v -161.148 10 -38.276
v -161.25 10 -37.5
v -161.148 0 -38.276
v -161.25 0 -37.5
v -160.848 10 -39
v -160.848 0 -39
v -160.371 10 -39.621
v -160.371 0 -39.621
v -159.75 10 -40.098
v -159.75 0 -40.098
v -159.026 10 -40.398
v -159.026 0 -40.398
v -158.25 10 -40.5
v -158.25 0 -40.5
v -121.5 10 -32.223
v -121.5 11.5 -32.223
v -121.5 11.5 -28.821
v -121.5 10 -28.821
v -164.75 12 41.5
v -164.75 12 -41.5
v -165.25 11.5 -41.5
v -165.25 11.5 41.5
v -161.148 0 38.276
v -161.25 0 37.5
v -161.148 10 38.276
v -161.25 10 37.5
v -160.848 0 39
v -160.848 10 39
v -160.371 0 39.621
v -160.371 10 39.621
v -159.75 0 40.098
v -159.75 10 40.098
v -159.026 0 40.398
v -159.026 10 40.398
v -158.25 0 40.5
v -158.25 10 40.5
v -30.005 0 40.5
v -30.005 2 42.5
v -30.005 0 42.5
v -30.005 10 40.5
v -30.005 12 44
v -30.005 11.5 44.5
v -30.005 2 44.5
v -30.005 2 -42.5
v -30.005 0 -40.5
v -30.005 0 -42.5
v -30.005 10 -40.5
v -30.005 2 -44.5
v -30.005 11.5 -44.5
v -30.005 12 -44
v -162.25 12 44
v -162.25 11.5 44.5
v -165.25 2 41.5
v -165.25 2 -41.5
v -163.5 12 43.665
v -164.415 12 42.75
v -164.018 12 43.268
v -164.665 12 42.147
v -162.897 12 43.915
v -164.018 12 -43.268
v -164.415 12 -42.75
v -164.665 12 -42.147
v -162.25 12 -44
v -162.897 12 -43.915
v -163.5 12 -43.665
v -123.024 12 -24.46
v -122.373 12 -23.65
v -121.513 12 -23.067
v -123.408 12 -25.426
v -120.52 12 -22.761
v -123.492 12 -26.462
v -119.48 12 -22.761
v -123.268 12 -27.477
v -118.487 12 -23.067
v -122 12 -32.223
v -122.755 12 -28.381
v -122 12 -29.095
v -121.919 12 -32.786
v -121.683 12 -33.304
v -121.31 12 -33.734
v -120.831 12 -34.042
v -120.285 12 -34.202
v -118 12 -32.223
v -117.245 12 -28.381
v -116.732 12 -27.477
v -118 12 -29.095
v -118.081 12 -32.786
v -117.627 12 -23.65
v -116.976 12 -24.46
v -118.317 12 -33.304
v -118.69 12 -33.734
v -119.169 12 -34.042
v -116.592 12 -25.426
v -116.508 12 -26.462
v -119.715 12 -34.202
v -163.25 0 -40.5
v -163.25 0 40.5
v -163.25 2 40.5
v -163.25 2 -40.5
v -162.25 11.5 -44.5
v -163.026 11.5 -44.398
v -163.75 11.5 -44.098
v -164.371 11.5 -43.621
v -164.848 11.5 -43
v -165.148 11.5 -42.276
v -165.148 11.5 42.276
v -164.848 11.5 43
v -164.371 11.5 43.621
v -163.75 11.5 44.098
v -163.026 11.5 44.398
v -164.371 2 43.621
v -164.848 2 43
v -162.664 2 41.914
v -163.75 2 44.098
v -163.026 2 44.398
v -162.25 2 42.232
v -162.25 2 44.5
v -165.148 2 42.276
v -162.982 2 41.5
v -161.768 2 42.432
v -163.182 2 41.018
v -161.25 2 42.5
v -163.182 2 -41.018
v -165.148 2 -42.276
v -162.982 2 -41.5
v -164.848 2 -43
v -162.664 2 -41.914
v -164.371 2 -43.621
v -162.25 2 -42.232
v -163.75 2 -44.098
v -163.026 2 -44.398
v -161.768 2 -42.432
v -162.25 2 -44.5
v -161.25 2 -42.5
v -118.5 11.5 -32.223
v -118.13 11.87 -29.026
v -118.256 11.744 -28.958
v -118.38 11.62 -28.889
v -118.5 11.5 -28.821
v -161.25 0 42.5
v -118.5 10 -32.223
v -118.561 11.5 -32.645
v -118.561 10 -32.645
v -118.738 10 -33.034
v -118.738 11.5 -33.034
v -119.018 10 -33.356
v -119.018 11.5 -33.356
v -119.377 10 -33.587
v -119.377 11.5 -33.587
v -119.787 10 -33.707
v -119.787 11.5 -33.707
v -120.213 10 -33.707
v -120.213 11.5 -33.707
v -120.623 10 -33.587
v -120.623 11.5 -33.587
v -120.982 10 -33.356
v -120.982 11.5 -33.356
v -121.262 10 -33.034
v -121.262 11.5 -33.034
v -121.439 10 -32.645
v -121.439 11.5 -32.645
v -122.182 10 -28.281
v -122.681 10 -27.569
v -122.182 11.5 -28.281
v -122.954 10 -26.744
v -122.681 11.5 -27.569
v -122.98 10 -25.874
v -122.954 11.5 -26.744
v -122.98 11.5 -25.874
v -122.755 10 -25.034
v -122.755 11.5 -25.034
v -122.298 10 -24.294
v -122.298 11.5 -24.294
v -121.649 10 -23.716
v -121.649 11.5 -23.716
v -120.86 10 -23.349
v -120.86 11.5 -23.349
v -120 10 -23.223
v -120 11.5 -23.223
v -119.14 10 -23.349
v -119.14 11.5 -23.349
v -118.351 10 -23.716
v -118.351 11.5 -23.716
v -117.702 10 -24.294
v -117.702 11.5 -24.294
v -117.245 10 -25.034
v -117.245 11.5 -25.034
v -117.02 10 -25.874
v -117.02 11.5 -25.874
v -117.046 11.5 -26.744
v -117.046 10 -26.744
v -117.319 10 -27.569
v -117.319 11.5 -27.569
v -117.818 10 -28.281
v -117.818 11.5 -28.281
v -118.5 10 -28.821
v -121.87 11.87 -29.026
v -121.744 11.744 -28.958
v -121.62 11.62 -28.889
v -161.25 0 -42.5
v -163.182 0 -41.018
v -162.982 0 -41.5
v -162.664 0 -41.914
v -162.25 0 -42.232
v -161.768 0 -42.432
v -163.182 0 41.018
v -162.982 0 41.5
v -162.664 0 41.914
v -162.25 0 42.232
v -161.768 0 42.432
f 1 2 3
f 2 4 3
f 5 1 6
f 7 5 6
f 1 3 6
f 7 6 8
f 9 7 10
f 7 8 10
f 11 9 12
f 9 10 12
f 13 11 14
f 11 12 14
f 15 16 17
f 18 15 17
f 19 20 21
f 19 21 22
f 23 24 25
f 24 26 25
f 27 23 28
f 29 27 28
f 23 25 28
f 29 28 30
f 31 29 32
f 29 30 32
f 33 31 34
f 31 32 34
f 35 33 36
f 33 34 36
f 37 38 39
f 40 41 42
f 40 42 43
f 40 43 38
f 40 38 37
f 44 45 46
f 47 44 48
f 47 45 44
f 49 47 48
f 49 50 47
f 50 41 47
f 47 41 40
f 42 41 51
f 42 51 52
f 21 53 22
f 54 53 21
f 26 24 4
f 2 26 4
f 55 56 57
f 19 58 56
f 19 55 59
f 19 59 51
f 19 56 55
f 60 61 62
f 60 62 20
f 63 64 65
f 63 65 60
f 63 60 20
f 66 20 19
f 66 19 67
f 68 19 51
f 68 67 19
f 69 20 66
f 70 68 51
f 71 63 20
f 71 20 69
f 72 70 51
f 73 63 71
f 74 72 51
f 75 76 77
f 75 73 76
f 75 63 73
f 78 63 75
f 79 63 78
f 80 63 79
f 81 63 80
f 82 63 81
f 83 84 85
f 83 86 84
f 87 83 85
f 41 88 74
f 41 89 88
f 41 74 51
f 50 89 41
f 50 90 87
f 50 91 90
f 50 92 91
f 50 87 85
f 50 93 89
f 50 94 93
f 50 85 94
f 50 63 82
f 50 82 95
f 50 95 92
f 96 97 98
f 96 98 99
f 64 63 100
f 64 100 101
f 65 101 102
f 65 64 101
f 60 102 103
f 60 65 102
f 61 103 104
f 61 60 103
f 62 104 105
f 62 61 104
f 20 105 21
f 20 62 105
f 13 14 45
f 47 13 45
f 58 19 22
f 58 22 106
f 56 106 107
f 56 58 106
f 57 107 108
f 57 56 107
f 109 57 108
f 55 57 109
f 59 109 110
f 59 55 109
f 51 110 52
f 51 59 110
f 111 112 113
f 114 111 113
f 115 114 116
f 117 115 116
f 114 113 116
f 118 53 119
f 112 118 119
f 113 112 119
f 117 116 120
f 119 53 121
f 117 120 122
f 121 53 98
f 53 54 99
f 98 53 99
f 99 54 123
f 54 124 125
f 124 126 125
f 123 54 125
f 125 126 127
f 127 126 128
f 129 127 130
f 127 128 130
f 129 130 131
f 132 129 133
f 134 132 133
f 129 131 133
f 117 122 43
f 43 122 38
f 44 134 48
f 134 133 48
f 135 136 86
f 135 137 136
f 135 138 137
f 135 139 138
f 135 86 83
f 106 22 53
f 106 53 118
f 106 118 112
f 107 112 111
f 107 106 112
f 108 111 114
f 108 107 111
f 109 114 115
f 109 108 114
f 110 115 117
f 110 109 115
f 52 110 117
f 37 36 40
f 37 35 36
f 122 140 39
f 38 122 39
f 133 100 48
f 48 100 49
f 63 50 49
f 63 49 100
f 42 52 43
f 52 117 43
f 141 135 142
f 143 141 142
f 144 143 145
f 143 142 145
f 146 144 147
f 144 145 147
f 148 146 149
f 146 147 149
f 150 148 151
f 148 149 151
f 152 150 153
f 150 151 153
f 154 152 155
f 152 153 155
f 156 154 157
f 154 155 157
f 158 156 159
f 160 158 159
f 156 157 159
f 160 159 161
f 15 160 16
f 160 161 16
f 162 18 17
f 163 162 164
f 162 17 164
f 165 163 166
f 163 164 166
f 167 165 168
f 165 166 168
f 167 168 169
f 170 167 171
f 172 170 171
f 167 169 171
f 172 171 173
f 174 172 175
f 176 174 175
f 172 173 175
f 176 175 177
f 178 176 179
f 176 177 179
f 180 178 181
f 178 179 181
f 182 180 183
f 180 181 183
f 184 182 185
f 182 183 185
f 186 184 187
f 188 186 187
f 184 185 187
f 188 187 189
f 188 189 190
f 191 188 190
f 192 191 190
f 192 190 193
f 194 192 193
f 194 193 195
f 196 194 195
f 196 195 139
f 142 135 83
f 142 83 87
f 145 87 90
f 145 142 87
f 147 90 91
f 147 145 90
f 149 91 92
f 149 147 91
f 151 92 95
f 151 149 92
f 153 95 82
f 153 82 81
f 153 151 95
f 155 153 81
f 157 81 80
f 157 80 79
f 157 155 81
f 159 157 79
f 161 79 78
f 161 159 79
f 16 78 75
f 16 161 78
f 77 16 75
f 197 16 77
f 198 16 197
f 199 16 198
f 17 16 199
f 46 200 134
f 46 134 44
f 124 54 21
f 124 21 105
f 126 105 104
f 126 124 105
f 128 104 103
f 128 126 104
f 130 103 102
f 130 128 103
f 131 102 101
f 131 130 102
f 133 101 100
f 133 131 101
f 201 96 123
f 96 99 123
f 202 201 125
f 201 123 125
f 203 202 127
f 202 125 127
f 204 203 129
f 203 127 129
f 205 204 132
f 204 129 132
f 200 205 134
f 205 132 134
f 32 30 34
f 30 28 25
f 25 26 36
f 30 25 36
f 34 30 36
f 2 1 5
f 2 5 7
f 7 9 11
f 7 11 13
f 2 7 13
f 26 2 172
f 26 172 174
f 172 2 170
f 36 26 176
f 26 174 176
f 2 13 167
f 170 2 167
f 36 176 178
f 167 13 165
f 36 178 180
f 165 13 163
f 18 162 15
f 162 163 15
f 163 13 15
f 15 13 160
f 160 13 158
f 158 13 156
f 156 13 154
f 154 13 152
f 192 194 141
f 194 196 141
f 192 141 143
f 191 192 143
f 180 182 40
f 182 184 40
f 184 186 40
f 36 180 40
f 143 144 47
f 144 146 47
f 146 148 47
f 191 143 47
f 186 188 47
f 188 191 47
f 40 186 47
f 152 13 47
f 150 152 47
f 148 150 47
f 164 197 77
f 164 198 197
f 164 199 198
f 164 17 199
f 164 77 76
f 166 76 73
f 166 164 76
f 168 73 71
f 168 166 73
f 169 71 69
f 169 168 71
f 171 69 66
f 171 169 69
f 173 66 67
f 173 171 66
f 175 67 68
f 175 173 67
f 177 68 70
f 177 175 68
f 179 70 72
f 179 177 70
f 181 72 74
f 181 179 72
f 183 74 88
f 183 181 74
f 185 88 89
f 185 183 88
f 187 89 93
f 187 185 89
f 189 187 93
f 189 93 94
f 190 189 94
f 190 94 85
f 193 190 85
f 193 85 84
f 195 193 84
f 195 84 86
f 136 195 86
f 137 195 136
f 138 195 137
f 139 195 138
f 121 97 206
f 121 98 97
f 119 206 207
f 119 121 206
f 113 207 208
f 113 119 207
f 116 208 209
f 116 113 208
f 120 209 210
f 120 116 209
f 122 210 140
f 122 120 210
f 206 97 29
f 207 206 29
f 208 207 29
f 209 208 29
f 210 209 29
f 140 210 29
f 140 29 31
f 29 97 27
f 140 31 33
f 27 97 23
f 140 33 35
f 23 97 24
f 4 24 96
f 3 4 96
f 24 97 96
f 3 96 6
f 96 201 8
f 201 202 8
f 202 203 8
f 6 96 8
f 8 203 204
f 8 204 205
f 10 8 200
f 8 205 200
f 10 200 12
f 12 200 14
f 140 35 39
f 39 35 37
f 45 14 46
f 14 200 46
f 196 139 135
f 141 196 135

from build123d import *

# Parameters (mm, degrees)
SKETCH1_W           = 326.5
SKETCH1_H           = 85
SKETCH1_W_2         = 322.5
SKETCH1_H_2         = 81
BOSS_EXTRUDE1_DEPTH = 10
SKETCH2_W           = 330.5
SKETCH2_H           = 89
SKETCH2_W_2         = 322.5
SKETCH2_H_2         = 81
BOSS_EXTRUDE2_DEPTH = 8
SKETCH3_W           = 330.5
SKETCH3_H           = 89
BOSS_EXTRUDE3_DEPTH = 2
FILLET1_R           = 3
FILLET2_R           = 2
FILLET3_R           = 3
CHAMFER1_SIZE       = 0.5
CUT_EXTRUDE1_DEPTH  = 172.557024047
CHAMFER2_SIZE       = 0.5
SKETCH7_W           = 40
SKETCH7_H           = 6.166023439
CUT_EXTRUDE3_DEPTH  = 189.075948755
BOSS_EXTRUDE4_REACH = 190.076
FILLET4_R           = 2
CHAMFER3_SIZE       = 0.5
FILLET5_R           = 3
FILLET6_R           = 2
SKETCH9_R           = 16.25
SKETCH9_R_2         = 14.25
BOSS_EXTRUDE5_DEPTH = 3
SKETCH10_R          = 1.5
SKETCH10_R_2        = 2
SKETCH10_R_3        = 2.25
CUT_EXTRUDE4_DEPTH  = 172.279924393
CHAMFER4_SIZE       = 0.5
SKETCH12_W          = 30.6
SKETCH12_H          = 39
SKETCH12_W_2        = 26.6
SKETCH12_H_2        = 35
BOSS_EXTRUDE6_DEPTH = 6
SKETCH13_W          = 30.6
SKETCH13_H          = 4
BOSS_EXTRUDE7_DEPTH = 2.7
SKETCH14_W          = 3.373769955
SKETCH14_H          = 15.899358316
SKETCH14_W_2        = 15.312861043
SKETCH14_H_2        = 6.106571476
SKETCH14_W_3        = 6.70369678
SKETCH14_H_3        = 18.082973575
CUT_EXTRUDE5_DEPTH  = 6
FILLET7_R           = 2
CUT_EXTRUDE6_DEPTH  = 12.7
CUT_EXTRUDE7_DEPTH  = 12.7
CUT_EXTRUDE8_DEPTH  = 12.7
SKETCH19_W          = 25
SKETCH19_H          = 25.3
SKETCH19_W_2        = 21
SKETCH19_H_2        = 21.3
BOSS_EXTRUDE8_DEPTH = 6
SKETCH20_W          = 17
SKETCH20_H          = 11.292116592
CUT_EXTRUDE9_DEPTH  = 6
FILLET8_R           = 2
FILLET9_R           = 2
FILLET10_R          = 1
SKETCH18_W          = 231.079625222
SKETCH18_H          = 131.716143141
CUT_EXTRUDE11_DEPTH = 172.557024047


# Some blends are built 0.0001 mm under size
with BuildPart() as part:
    # Sketch1 → Boss-Extrude1 (new body)
    with BuildSketch(Plane(origin=(0, 0, 0), x_dir=(1, 0, 0), z_dir=(0, 1, 0))):
        Rectangle(SKETCH1_W, SKETCH1_H)
        Rectangle(SKETCH1_W_2, SKETCH1_H_2, mode=Mode.SUBTRACT)
    extrude(amount=BOSS_EXTRUDE1_DEPTH)

    # Sketch2 → Boss-Extrude2 (add)
    with BuildSketch(Plane(origin=(0, 10, 0), x_dir=(1, 0, 0), z_dir=(0, 1, 0))):
        Rectangle(SKETCH2_W, SKETCH2_H)
        Rectangle(SKETCH2_W_2, SKETCH2_H_2, mode=Mode.SUBTRACT)
    extrude(amount=-BOSS_EXTRUDE2_DEPTH)

    # Sketch3 → Boss-Extrude3 (add)
    with BuildSketch(Plane(origin=(0, 10, 0), x_dir=(1, 0, 0), z_dir=(0, 1, 0))):
        Rectangle(SKETCH3_W, SKETCH3_H)
    extrude(amount=BOSS_EXTRUDE3_DEPTH)

    # Fillet1
    fillet1_edges = [part.edges().sort_by_distance(p)[0] for p in [
        (161.25, 5, 40.5),
        (161.25, 5, -40.5),
        (-161.25, 5, -40.5),
        (-161.25, 5, 40.5),
    ]]
    fillet(fillet1_edges, radius=FILLET1_R)

    # Fillet2
    fillet2_edges = [part.edges().sort_by_distance(p)[0] for p in [
        (163.25, 1, 42.5),
        (-163.25, 1, 42.5),
        (-163.25, 1, -42.5),
        (163.25, 1, -42.5),
    ]]
    fillet(fillet2_edges, radius=FILLET2_R)

    # Fillet3
    fillet3_edges = [part.edges().sort_by_distance(p)[0] for p in [
        (165.25, 7, -44.5),
        (165.25, 7, 44.5),
        (-165.25, 7, 44.5),
        (-165.25, 7, -44.5),
    ]]
    fillet(fillet3_edges, radius=FILLET3_R)

    # Chamfer1
    chamfer1_edges = [part.edges().sort_by_distance(p)[0] for p in [
        (165.25, 12, 0),
        (-165.25, 12, 0),
        (0, 12, 44.5),
        (0, 12, -44.5),
        (-164.371320344, 12, -43.621320344),
        (-164.371320344, 12, 43.621320344),
        (164.371320344, 12, 43.621320344),
        (164.371320344, 12, -43.621320344),
    ]]
    chamfer(chamfer1_edges, length=CHAMFER1_SIZE)

    # Sketch4 → Cut-Extrude1 (cut, through all)
    with BuildSketch(Plane(origin=(0, 12, 0), x_dir=(1, 0, 0), z_dir=(0, 1, 0))):
        with BuildLine():
            Line((-121.5, 32.222687085), (-121.5, 28.820763297))
            ThreePointArc((-121.5, 28.820763297), (-120, 23.222687085), (-118.5, 28.820763297))
            Line((-118.5, 28.820763297), (-118.5, 32.222687085))
            ThreePointArc((-118.5, 32.222687085), (-120, 33.722687085), (-121.5, 32.222687085))
        make_face()
        with BuildLine():
            Line((118.5, 32.222687085), (118.5, 28.820763297))
            ThreePointArc((118.5, 28.820763297), (120, 23.222687085), (121.5, 28.820763297))
            Line((121.5, 28.820763297), (121.5, 32.222687085))
            ThreePointArc((121.5, 32.222687085), (120, 33.722687085), (118.5, 32.222687085))
        make_face()
    extrude(amount=-CUT_EXTRUDE1_DEPTH, mode=Mode.SUBTRACT)

    # Chamfer2
    chamfer2_edges = [part.edges().sort_by_distance(p)[0] for p in [
        (-120, 12, -33.722687085),
        (-121.5, 12, -30.521725191),
        (-120, 12, -23.222687085),
        (-118.5, 12, -30.521725191),
        (120, 12, -33.722687085),
        (118.5, 12, -30.521725191),
        (120, 12, -23.222687085),
        (121.5, 12, -30.521725191),
    ]]
    chamfer(chamfer2_edges, length=CHAMFER2_SIZE)

    # Sketch7 → Cut-Extrude3 (cut, through all)
    with BuildSketch(Plane(origin=(0, 0, -44.5), x_dir=(-1, 0, 0), z_dir=(0, 0, -1))):
        with Locations((0, 12.083011719)):
            Rectangle(SKETCH7_W, SKETCH7_H)
    extrude(amount=-CUT_EXTRUDE3_DEPTH, mode=Mode.SUBTRACT)

    # Boss-Extrude4: up to this face of the body (flat: up to its plane)
    boss_extrude4_end = Plane(part.part.faces().sort_by_distance((0, 6.63265862, 44.5))[0])
    # Sketch8 → Boss-Extrude4 (add, up to the picked face)
    with BuildSketch(Plane(origin=(0, 0, -44.5), x_dir=(-1, 0, 0), z_dir=(0, 0, -1)), mode=Mode.PRIVATE) as boss_extrude4_sk1:
        Polygon((-20, 12), (-20, 9), (20, 9), (20, 12), (22, 12), (22, 7), (-22, 7), (-22, 12), align=None)
    boss_extrude4_tool1 = split(extrude(boss_extrude4_sk1.sketch, amount=-BOSS_EXTRUDE4_REACH, mode=Mode.PRIVATE), bisect_by=boss_extrude4_end, keep=Keep.BOTH, mode=Mode.PRIVATE)
    add(boss_extrude4_tool1.solids().sort_by(Axis((0, 8.3, -44.5), (0, 0, 1)))[0])

    # Fillet4
    fillet4_edges = [part.edges().sort_by_distance(p)[0] for p in [
        (-20, 9, 0),
        (20, 9, 0),
    ]]
    fillet(fillet4_edges, radius=FILLET4_R)

    # Chamfer3
    # the kernel refuses this chamfer: 0.5 mm, written as the material it takes off along each edge
    with BuildSketch(Plane(origin=(22, 10.214158506, 44.5), x_dir=(-0.999621916911297, -2.130822274703722e-15, 0.027495876610582105), z_dir=(0, 1, 0))) as chamfer3_piece_1_section:
        Polygon((CHAMFER3_SIZE * 0.999621916911, -CHAMFER3_SIZE * 0.0274958766106), (-CHAMFER3_SIZE * 0.0274958766106, -CHAMFER3_SIZE * 0.999621916911), (0, 0), align=None)
    chamfer3_piece_1 = extrude(amount=3.071682988, mode=Mode.PRIVATE)
    chamfer3_piece_1 = split(chamfer3_piece_1, bisect_by=Plane(origin=(21.8125, 11.71875, 44.28125), z_dir=(0, 0.7071067811865476, 0.7071067811865476)), keep=Keep.TOP, mode=Mode.PRIVATE)
    add(chamfer3_piece_1, mode=Mode.SUBTRACT)
    with BuildSketch(Plane(origin=(-22, 12, -45.785841494), x_dir=(0.9996219169112968, 0.02749587661058555, 0), z_dir=(0, 0, 1))) as chamfer3_piece_2_section:
        Polygon((CHAMFER3_SIZE * 0.999621916911, -CHAMFER3_SIZE * 0.0274958766106), (-CHAMFER3_SIZE * 0.0274958766106, -CHAMFER3_SIZE * 0.999621916911), (0, 0), align=None)
    chamfer3_piece_2 = extrude(amount=3.071682988, mode=Mode.PRIVATE)
    chamfer3_piece_2 = split(chamfer3_piece_2, bisect_by=Plane(origin=(-21.8125, 11.78125, -44.21875), z_dir=(0, 0.7071067811865476, -0.7071067811865476)), keep=Keep.TOP, mode=Mode.PRIVATE)
    add(chamfer3_piece_2, mode=Mode.SUBTRACT)
    with BuildSketch(Plane(origin=(22, 12, -45.785841494), x_dir=(-0.9996219169112968, 0.02749587661058555, 0), z_dir=(0, 0, 1))) as chamfer3_piece_3_section:
        Polygon((CHAMFER3_SIZE * 0.999621916911, CHAMFER3_SIZE * 0.0274958766106), (-CHAMFER3_SIZE * 0.0274958766106, CHAMFER3_SIZE * 0.999621916911), (0, 0), align=None)
    chamfer3_piece_3 = extrude(amount=3.071682988, mode=Mode.PRIVATE)
    chamfer3_piece_3 = split(chamfer3_piece_3, bisect_by=Plane(origin=(21.8125, 11.78125, -44.21875), z_dir=(0, 0.7071067811865476, -0.7071067811865476)), keep=Keep.TOP, mode=Mode.PRIVATE)
    add(chamfer3_piece_3, mode=Mode.SUBTRACT)
    with BuildSketch(Plane(origin=(23.285841494, 12, -44.5), x_dir=(0, -0.999621916911297, -0.0274958766105822), z_dir=(-1, 0, 0)), Plane(origin=(-18.714158506, 12, -44.5), x_dir=(0, -0.999621916911297, -0.0274958766105822), z_dir=(-1, 0, 0)), Plane(origin=(-18.714158506, 12, 44.5), x_dir=(0, 0.02749587661058574, -0.9996219169112968), z_dir=(-1, 0, 0))) as chamfer3_piece_4:
        Polygon((CHAMFER3_SIZE * 0.999621916911, CHAMFER3_SIZE * 0.0274958766106), (-CHAMFER3_SIZE * 0.0274958766106, CHAMFER3_SIZE * 0.999621916911), (0, 0), align=None)
    extrude(amount=4.571682988, mode=Mode.SUBTRACT)
    with BuildSketch(Plane(origin=(22, 10.214158506, -44.5), x_dir=(-0.999621916911297, -2.130822274703722e-15, -0.027495876610582105), z_dir=(0, 1, 0))) as chamfer3_piece_5_section:
        Polygon((CHAMFER3_SIZE * 0.999621916911, CHAMFER3_SIZE * 0.0274958766106), (-CHAMFER3_SIZE * 0.0274958766106, CHAMFER3_SIZE * 0.999621916911), (0, 0), align=None)
    chamfer3_piece_5 = extrude(amount=3.071682988, mode=Mode.PRIVATE)
    chamfer3_piece_5 = split(chamfer3_piece_5, bisect_by=Plane(origin=(21.8125, 11.71875, -44.28125), z_dir=(0, 0.7071067811865476, -0.7071067811865476)), keep=Keep.TOP, mode=Mode.PRIVATE)
    add(chamfer3_piece_5, mode=Mode.SUBTRACT)
    with BuildSketch(Plane(origin=(-22, 13.285841494, -44.5), x_dir=(0.999621916911297, 0, -0.027495876610582105), z_dir=(0, -1, 0))) as chamfer3_piece_6_section:
        Polygon((CHAMFER3_SIZE * 0.999621916911, CHAMFER3_SIZE * 0.0274958766106), (-CHAMFER3_SIZE * 0.0274958766106, CHAMFER3_SIZE * 0.999621916911), (0, 0), align=None)
    chamfer3_piece_6 = extrude(amount=3.071682988, mode=Mode.PRIVATE)
    chamfer3_piece_6 = split(chamfer3_piece_6, bisect_by=Plane(origin=(-21.8125, 11.71875, -44.28125), z_dir=(0, 0.7071067811865476, -0.7071067811865476)), keep=Keep.TOP, mode=Mode.PRIVATE)
    add(chamfer3_piece_6, mode=Mode.SUBTRACT)
    with BuildSketch(Plane(origin=(-22, 12, 42.714158506), x_dir=(0.9996219169112968, 0.02749587661058555, 0), z_dir=(0, 0, 1))) as chamfer3_piece_7_section:
        Polygon((CHAMFER3_SIZE * 0.999621916911, -CHAMFER3_SIZE * 0.0274958766106), (-CHAMFER3_SIZE * 0.0274958766106, -CHAMFER3_SIZE * 0.999621916911), (0, 0), align=None)
    chamfer3_piece_7 = extrude(amount=3.071682988, mode=Mode.PRIVATE)
    chamfer3_piece_7 = split(chamfer3_piece_7, bisect_by=Plane(origin=(-21.8125, 11.78125, 44.21875), z_dir=(0, 0.7071067811865476, 0.7071067811865476)), keep=Keep.TOP, mode=Mode.PRIVATE)
    add(chamfer3_piece_7, mode=Mode.SUBTRACT)
    with BuildSketch(Plane(origin=(-22, 13.285841494, 44.5), x_dir=(0.999621916911297, 0, 0.027495876610582105), z_dir=(0, -1, 0))) as chamfer3_piece_8_section:
        Polygon((CHAMFER3_SIZE * 0.999621916911, -CHAMFER3_SIZE * 0.0274958766106), (-CHAMFER3_SIZE * 0.0274958766106, -CHAMFER3_SIZE * 0.999621916911), (0, 0), align=None)
    chamfer3_piece_8 = extrude(amount=3.071682988, mode=Mode.PRIVATE)
    chamfer3_piece_8 = split(chamfer3_piece_8, bisect_by=Plane(origin=(-21.8125, 11.71875, 44.28125), z_dir=(0, 0.7071067811865476, 0.7071067811865476)), keep=Keep.TOP, mode=Mode.PRIVATE)
    add(chamfer3_piece_8, mode=Mode.SUBTRACT)
    with BuildSketch(Plane(origin=(22, 12, 42.714158506), x_dir=(-0.9996219169112968, 0.02749587661058555, 0), z_dir=(0, 0, 1))) as chamfer3_piece_9_section:
        Polygon((CHAMFER3_SIZE * 0.999621916911, CHAMFER3_SIZE * 0.0274958766106), (-CHAMFER3_SIZE * 0.0274958766106, CHAMFER3_SIZE * 0.999621916911), (0, 0), align=None)
    chamfer3_piece_9 = extrude(amount=3.071682988, mode=Mode.PRIVATE)
    chamfer3_piece_9 = split(chamfer3_piece_9, bisect_by=Plane(origin=(21.8125, 11.78125, 44.21875), z_dir=(0, 0.7071067811865476, 0.7071067811865476)), keep=Keep.TOP, mode=Mode.PRIVATE)
    add(chamfer3_piece_9, mode=Mode.SUBTRACT)
    with BuildSketch(Plane(origin=(23.285841494, 12, 44.5), x_dir=(0, -0.999621916911297, 0.0274958766105822), z_dir=(-1, 0, 0))) as chamfer3_piece_10:
        Polygon((CHAMFER3_SIZE * 0.999621916911, -CHAMFER3_SIZE * 0.0274958766106), (-CHAMFER3_SIZE * 0.0274958766106, -CHAMFER3_SIZE * 0.999621916911), (0, 0), align=None)
    extrude(amount=4.571682988, mode=Mode.SUBTRACT)

    # Fillet5
    fillet5_edges = [part.edges().sort_by_distance(p)[0] for p in [
        (20, 11.25, 44.5),
        (19.414213562, 9.585786438, 44.5),
        (-20, 11.25, 44.5),
        (-19.414213562, 9.585786438, 44.5),
        (20, 11.25, -44.5),
        (19.414213562, 9.585786438, -44.5),
        (-20, 11.25, -44.5),
        (-19.414213562, 9.585786438, -44.5),
        (0, 9, -44.5),
        (0, 9, 44.5),
    ]]
    fillet(fillet5_edges, radius=FILLET5_R)

    # Fillet6
    fillet6_edges = [part.edges().sort_by_distance(p)[0] for p in [
        (22, 10, 0),
        (-22, 10, 0),
    ]]
    fillet(fillet6_edges, radius=FILLET6_R)

    # Sketch9 → Boss-Extrude5 (add)
    with BuildSketch(Plane.XZ.offset(-7)):
        Circle(SKETCH9_R)
        Circle(SKETCH9_R_2, mode=Mode.SUBTRACT)
    extrude(amount=BOSS_EXTRUDE5_DEPTH)

    # Sketch10 → Cut-Extrude4 (cut, through all)
    with BuildSketch(Plane.XZ.offset(-7)):
        with Locations((0, 3)):
            Circle(SKETCH10_R)
        with Locations((0, 7)):
            Circle(SKETCH10_R_2)
        with Locations((0, 12)):
            Circle(SKETCH10_R_3)
        with Locations((4.499513268, 5.362311102)):
            Circle(SKETCH10_R_2)
        with Locations((6.893654271, 1.215537244)):
            Circle(SKETCH10_R_2)
        with Locations((6.062177826, -3.5)):
            Circle(SKETCH10_R_2)
        with Locations((2.394141003, -6.577848346)):
            Circle(SKETCH10_R_2)
        with Locations((-2.394141003, -6.577848346)):
            Circle(SKETCH10_R_2)
        with Locations((-6.062177826, -3.5)):
            Circle(SKETCH10_R_2)
        with Locations((-6.893654271, 1.215537244)):
            Circle(SKETCH10_R_2)
        with Locations((-4.499513268, 5.362311102)):
            Circle(SKETCH10_R_2)
        with Locations((3, 0)):
            Circle(SKETCH10_R)
        with Locations((0, -3)):
            Circle(SKETCH10_R)
        with Locations((-3, 0)):
            Circle(SKETCH10_R)
        with Locations((5.576678065, 10.625472308)):
            Circle(SKETCH10_R_3)
        with Locations((9.875806391, 6.816776961)):
            Circle(SKETCH10_R_3)
        with Locations((11.912506489, 1.446440163)):
            Circle(SKETCH10_R_3)
        with Locations((11.220194912, -4.255258645)):
            Circle(SKETCH10_R_3)
        with Locations((7.957471899, -8.982128978)):
            Circle(SKETCH10_R_3)
        with Locations((2.871787971, -11.651301809)):
            Circle(SKETCH10_R_3)
        with Locations((-2.871787971, -11.651301809)):
            Circle(SKETCH10_R_3)
        with Locations((-7.957471899, -8.982128978)):
            Circle(SKETCH10_R_3)
        with Locations((-11.220194912, -4.255258645)):
            Circle(SKETCH10_R_3)
        with Locations((-11.912506489, 1.446440163)):
            Circle(SKETCH10_R_3)
        with Locations((-9.875806391, 6.816776961)):
            Circle(SKETCH10_R_3)
        with Locations((-5.576678065, 10.625472308)):
            Circle(SKETCH10_R_3)
    extrude(amount=-CUT_EXTRUDE4_DEPTH, mode=Mode.SUBTRACT)

    # Chamfer4
    chamfer4_edges = [part.edges().sort_by_distance(p)[0] for p in [
        (20, 12, 0),
        (20.356617963, 12, -42.918637165),
        (20.356617963, 12, 42.918637165),
        (-20, 12, 0),
        (-20.356617963, 12, -42.918637165),
        (-20.356617963, 12, 42.918637165),
    ]]
    chamfer(chamfer4_edges, length=CHAMFER4_SIZE - 0.0001)  # a hair under: the kernel refuses the full size

    # Sketch12 → Boss-Extrude6 (add)
    with BuildSketch(Plane.XZ.offset(-10)):
        with Locations((142.95, 3)):
            Rectangle(SKETCH12_W, SKETCH12_H)
        with Locations((142.95, 3)):
            Rectangle(SKETCH12_W_2, SKETCH12_H_2, mode=Mode.SUBTRACT)
    extrude(amount=BOSS_EXTRUDE6_DEPTH)

    # Sketch13 → Boss-Extrude7 (add)
    with BuildSketch(Plane.XZ.offset(-10)):
        with Locations((142.95, -14.5)):
            Rectangle(SKETCH13_W, SKETCH13_H)
    extrude(amount=BOSS_EXTRUDE7_DEPTH)

    # Sketch14 → Cut-Extrude5 (cut)
    with BuildSketch(Plane.XZ.offset(-4)):
        with Locations((157.936884978, 16.074384573)):
            Rectangle(SKETCH14_W, SKETCH14_H)
        with Locations((143.337214565, 21.464137582)):
            Rectangle(SKETCH14_W_2, SKETCH14_H_2)
        with Locations((129.195604024, 2.873540073)):
            Rectangle(SKETCH14_W_3, SKETCH14_H_3)
    extrude(amount=-CUT_EXTRUDE5_DEPTH, mode=Mode.SUBTRACT)

    # Fillet7
    fillet7_edges = [part.edges().sort_by_distance(p)[0] for p in [
        (150.993645086, 7, 20.5),
        (135.680784043, 7, 20.5),
        (129.65, 7, 11.91502686),
        (156.25, 7, 8.124705415),
        (129.65, 7, -6.167946715),
    ]]
    fillet(fillet7_edges, radius=FILLET7_R - 0.0001)  # a hair under: the kernel refuses the full size

    # Sketch15 → Cut-Extrude6 (cut)
    with BuildSketch(Plane.XY.offset(-40.5)):
        with BuildLine():
            Line((142.732418969, 8.83308219), (145.68707631, 8.83308219))
            ThreePointArc((145.68707631, 8.83308219), (146.85974764, 6.63308219), (145.68707631, 4.43308219))
            Line((145.68707631, 4.43308219), (142.732418969, 4.43308219))
            ThreePointArc((142.732418969, 4.43308219), (141.55974764, 6.63308219), (142.732418969, 8.83308219))
        make_face()
    extrude(amount=-CUT_EXTRUDE6_DEPTH, mode=Mode.SUBTRACT)

    # Sketch16 → Cut-Extrude7 (cut)
    with BuildSketch(Plane(origin=(0, 0, 40.5), x_dir=(-1, 0, 0), z_dir=(0, 0, -1))):
        with BuildLine():
            Line((-146.114315764, 9.98869973), (-139.089315764, 9.98869973))
            ThreePointArc((-139.089315764, 9.98869973), (-134.714315764, 5.61369973), (-139.089315764, 1.23869973))
            Line((-139.089315764, 1.23869973), (-146.114315764, 1.23869973))
            Line((-146.114315764, 1.23869973), (-146.114315764, 5.61369973))
            Line((-146.114315764, 5.61369973), (-146.114315764, 9.98869973))
        make_face()
    extrude(amount=-CUT_EXTRUDE7_DEPTH, mode=Mode.SUBTRACT)

    # Sketch17 → Cut-Extrude8 (cut)
    with BuildSketch(Plane.XY.offset(44.5)):
        Polygon((136.623185341, 2), (146.114315764, 4.571516723), (146.114315764, -5.033546584), (136.623185341, -4.403350122), align=None)
    extrude(amount=-CUT_EXTRUDE8_DEPTH, mode=Mode.SUBTRACT)

    # Sketch19 → Boss-Extrude8 (add)
    with BuildSketch(Plane.XZ.offset(-10)):
        with Locations((48.241330984, -14.734055582)):
            Rectangle(SKETCH19_W, SKETCH19_H)
        with Locations((48.241330984, -14.734055582)):
            Rectangle(SKETCH19_W_2, SKETCH19_H_2, mode=Mode.SUBTRACT)
    extrude(amount=BOSS_EXTRUDE8_DEPTH)

    # Sketch20 → Cut-Extrude9 (cut)
    with BuildSketch(Plane.XZ.offset(-4)):
        with Locations((48.241330984, -27.384055582)):
            Rectangle(SKETCH20_W, SKETCH20_H)
    extrude(amount=-CUT_EXTRUDE9_DEPTH, mode=Mode.SUBTRACT)

    # Fillet8
    fillet8_edges = [part.edges().sort_by_distance(p)[0] for p in [
        (39.741330984, 7, -25.384055582),
        (56.741330984, 7, -25.384055582),
    ]]
    fillet(fillet8_edges, radius=FILLET8_R - 0.0001)  # a hair under: the kernel refuses the full size

    # Fillet9
    fillet9_edges = [part.edges().sort_by_distance(p)[0] for p in [
        (60.741330984, 7, -2.084055582),
        (35.741330984, 7, -2.084055582),
        (158.25, 7, -16.5),
        (127.65, 7, 22.5),
        (127.65, 7, -16.5),
    ]]
    fillet(fillet9_edges, radius=FILLET9_R)

    # Fillet10
    fillet10_edges = [part.edges().sort_by_distance(p)[0] for p in [
        (-16.25, 4, 0),
        (-16.25, 7, 0),
        (-14.25, 4, 0),
    ]]
    fillet(fillet10_edges, radius=FILLET10_R - 0.0001)  # a hair under: the kernel refuses the full size

    # Sketch18 → Cut-Extrude11 (cut, through all)
    with BuildSketch(Plane(origin=(0, 12, 0), x_dir=(1, 0, 0), z_dir=(0, 1, 0))):
        with Locations((85.53434117, -3.596714528)):
            Rectangle(SKETCH18_W, SKETCH18_H)
    extrude(amount=-CUT_EXTRUDE11_DEPTH, mode=Mode.SUBTRACT)


solid = part.part
